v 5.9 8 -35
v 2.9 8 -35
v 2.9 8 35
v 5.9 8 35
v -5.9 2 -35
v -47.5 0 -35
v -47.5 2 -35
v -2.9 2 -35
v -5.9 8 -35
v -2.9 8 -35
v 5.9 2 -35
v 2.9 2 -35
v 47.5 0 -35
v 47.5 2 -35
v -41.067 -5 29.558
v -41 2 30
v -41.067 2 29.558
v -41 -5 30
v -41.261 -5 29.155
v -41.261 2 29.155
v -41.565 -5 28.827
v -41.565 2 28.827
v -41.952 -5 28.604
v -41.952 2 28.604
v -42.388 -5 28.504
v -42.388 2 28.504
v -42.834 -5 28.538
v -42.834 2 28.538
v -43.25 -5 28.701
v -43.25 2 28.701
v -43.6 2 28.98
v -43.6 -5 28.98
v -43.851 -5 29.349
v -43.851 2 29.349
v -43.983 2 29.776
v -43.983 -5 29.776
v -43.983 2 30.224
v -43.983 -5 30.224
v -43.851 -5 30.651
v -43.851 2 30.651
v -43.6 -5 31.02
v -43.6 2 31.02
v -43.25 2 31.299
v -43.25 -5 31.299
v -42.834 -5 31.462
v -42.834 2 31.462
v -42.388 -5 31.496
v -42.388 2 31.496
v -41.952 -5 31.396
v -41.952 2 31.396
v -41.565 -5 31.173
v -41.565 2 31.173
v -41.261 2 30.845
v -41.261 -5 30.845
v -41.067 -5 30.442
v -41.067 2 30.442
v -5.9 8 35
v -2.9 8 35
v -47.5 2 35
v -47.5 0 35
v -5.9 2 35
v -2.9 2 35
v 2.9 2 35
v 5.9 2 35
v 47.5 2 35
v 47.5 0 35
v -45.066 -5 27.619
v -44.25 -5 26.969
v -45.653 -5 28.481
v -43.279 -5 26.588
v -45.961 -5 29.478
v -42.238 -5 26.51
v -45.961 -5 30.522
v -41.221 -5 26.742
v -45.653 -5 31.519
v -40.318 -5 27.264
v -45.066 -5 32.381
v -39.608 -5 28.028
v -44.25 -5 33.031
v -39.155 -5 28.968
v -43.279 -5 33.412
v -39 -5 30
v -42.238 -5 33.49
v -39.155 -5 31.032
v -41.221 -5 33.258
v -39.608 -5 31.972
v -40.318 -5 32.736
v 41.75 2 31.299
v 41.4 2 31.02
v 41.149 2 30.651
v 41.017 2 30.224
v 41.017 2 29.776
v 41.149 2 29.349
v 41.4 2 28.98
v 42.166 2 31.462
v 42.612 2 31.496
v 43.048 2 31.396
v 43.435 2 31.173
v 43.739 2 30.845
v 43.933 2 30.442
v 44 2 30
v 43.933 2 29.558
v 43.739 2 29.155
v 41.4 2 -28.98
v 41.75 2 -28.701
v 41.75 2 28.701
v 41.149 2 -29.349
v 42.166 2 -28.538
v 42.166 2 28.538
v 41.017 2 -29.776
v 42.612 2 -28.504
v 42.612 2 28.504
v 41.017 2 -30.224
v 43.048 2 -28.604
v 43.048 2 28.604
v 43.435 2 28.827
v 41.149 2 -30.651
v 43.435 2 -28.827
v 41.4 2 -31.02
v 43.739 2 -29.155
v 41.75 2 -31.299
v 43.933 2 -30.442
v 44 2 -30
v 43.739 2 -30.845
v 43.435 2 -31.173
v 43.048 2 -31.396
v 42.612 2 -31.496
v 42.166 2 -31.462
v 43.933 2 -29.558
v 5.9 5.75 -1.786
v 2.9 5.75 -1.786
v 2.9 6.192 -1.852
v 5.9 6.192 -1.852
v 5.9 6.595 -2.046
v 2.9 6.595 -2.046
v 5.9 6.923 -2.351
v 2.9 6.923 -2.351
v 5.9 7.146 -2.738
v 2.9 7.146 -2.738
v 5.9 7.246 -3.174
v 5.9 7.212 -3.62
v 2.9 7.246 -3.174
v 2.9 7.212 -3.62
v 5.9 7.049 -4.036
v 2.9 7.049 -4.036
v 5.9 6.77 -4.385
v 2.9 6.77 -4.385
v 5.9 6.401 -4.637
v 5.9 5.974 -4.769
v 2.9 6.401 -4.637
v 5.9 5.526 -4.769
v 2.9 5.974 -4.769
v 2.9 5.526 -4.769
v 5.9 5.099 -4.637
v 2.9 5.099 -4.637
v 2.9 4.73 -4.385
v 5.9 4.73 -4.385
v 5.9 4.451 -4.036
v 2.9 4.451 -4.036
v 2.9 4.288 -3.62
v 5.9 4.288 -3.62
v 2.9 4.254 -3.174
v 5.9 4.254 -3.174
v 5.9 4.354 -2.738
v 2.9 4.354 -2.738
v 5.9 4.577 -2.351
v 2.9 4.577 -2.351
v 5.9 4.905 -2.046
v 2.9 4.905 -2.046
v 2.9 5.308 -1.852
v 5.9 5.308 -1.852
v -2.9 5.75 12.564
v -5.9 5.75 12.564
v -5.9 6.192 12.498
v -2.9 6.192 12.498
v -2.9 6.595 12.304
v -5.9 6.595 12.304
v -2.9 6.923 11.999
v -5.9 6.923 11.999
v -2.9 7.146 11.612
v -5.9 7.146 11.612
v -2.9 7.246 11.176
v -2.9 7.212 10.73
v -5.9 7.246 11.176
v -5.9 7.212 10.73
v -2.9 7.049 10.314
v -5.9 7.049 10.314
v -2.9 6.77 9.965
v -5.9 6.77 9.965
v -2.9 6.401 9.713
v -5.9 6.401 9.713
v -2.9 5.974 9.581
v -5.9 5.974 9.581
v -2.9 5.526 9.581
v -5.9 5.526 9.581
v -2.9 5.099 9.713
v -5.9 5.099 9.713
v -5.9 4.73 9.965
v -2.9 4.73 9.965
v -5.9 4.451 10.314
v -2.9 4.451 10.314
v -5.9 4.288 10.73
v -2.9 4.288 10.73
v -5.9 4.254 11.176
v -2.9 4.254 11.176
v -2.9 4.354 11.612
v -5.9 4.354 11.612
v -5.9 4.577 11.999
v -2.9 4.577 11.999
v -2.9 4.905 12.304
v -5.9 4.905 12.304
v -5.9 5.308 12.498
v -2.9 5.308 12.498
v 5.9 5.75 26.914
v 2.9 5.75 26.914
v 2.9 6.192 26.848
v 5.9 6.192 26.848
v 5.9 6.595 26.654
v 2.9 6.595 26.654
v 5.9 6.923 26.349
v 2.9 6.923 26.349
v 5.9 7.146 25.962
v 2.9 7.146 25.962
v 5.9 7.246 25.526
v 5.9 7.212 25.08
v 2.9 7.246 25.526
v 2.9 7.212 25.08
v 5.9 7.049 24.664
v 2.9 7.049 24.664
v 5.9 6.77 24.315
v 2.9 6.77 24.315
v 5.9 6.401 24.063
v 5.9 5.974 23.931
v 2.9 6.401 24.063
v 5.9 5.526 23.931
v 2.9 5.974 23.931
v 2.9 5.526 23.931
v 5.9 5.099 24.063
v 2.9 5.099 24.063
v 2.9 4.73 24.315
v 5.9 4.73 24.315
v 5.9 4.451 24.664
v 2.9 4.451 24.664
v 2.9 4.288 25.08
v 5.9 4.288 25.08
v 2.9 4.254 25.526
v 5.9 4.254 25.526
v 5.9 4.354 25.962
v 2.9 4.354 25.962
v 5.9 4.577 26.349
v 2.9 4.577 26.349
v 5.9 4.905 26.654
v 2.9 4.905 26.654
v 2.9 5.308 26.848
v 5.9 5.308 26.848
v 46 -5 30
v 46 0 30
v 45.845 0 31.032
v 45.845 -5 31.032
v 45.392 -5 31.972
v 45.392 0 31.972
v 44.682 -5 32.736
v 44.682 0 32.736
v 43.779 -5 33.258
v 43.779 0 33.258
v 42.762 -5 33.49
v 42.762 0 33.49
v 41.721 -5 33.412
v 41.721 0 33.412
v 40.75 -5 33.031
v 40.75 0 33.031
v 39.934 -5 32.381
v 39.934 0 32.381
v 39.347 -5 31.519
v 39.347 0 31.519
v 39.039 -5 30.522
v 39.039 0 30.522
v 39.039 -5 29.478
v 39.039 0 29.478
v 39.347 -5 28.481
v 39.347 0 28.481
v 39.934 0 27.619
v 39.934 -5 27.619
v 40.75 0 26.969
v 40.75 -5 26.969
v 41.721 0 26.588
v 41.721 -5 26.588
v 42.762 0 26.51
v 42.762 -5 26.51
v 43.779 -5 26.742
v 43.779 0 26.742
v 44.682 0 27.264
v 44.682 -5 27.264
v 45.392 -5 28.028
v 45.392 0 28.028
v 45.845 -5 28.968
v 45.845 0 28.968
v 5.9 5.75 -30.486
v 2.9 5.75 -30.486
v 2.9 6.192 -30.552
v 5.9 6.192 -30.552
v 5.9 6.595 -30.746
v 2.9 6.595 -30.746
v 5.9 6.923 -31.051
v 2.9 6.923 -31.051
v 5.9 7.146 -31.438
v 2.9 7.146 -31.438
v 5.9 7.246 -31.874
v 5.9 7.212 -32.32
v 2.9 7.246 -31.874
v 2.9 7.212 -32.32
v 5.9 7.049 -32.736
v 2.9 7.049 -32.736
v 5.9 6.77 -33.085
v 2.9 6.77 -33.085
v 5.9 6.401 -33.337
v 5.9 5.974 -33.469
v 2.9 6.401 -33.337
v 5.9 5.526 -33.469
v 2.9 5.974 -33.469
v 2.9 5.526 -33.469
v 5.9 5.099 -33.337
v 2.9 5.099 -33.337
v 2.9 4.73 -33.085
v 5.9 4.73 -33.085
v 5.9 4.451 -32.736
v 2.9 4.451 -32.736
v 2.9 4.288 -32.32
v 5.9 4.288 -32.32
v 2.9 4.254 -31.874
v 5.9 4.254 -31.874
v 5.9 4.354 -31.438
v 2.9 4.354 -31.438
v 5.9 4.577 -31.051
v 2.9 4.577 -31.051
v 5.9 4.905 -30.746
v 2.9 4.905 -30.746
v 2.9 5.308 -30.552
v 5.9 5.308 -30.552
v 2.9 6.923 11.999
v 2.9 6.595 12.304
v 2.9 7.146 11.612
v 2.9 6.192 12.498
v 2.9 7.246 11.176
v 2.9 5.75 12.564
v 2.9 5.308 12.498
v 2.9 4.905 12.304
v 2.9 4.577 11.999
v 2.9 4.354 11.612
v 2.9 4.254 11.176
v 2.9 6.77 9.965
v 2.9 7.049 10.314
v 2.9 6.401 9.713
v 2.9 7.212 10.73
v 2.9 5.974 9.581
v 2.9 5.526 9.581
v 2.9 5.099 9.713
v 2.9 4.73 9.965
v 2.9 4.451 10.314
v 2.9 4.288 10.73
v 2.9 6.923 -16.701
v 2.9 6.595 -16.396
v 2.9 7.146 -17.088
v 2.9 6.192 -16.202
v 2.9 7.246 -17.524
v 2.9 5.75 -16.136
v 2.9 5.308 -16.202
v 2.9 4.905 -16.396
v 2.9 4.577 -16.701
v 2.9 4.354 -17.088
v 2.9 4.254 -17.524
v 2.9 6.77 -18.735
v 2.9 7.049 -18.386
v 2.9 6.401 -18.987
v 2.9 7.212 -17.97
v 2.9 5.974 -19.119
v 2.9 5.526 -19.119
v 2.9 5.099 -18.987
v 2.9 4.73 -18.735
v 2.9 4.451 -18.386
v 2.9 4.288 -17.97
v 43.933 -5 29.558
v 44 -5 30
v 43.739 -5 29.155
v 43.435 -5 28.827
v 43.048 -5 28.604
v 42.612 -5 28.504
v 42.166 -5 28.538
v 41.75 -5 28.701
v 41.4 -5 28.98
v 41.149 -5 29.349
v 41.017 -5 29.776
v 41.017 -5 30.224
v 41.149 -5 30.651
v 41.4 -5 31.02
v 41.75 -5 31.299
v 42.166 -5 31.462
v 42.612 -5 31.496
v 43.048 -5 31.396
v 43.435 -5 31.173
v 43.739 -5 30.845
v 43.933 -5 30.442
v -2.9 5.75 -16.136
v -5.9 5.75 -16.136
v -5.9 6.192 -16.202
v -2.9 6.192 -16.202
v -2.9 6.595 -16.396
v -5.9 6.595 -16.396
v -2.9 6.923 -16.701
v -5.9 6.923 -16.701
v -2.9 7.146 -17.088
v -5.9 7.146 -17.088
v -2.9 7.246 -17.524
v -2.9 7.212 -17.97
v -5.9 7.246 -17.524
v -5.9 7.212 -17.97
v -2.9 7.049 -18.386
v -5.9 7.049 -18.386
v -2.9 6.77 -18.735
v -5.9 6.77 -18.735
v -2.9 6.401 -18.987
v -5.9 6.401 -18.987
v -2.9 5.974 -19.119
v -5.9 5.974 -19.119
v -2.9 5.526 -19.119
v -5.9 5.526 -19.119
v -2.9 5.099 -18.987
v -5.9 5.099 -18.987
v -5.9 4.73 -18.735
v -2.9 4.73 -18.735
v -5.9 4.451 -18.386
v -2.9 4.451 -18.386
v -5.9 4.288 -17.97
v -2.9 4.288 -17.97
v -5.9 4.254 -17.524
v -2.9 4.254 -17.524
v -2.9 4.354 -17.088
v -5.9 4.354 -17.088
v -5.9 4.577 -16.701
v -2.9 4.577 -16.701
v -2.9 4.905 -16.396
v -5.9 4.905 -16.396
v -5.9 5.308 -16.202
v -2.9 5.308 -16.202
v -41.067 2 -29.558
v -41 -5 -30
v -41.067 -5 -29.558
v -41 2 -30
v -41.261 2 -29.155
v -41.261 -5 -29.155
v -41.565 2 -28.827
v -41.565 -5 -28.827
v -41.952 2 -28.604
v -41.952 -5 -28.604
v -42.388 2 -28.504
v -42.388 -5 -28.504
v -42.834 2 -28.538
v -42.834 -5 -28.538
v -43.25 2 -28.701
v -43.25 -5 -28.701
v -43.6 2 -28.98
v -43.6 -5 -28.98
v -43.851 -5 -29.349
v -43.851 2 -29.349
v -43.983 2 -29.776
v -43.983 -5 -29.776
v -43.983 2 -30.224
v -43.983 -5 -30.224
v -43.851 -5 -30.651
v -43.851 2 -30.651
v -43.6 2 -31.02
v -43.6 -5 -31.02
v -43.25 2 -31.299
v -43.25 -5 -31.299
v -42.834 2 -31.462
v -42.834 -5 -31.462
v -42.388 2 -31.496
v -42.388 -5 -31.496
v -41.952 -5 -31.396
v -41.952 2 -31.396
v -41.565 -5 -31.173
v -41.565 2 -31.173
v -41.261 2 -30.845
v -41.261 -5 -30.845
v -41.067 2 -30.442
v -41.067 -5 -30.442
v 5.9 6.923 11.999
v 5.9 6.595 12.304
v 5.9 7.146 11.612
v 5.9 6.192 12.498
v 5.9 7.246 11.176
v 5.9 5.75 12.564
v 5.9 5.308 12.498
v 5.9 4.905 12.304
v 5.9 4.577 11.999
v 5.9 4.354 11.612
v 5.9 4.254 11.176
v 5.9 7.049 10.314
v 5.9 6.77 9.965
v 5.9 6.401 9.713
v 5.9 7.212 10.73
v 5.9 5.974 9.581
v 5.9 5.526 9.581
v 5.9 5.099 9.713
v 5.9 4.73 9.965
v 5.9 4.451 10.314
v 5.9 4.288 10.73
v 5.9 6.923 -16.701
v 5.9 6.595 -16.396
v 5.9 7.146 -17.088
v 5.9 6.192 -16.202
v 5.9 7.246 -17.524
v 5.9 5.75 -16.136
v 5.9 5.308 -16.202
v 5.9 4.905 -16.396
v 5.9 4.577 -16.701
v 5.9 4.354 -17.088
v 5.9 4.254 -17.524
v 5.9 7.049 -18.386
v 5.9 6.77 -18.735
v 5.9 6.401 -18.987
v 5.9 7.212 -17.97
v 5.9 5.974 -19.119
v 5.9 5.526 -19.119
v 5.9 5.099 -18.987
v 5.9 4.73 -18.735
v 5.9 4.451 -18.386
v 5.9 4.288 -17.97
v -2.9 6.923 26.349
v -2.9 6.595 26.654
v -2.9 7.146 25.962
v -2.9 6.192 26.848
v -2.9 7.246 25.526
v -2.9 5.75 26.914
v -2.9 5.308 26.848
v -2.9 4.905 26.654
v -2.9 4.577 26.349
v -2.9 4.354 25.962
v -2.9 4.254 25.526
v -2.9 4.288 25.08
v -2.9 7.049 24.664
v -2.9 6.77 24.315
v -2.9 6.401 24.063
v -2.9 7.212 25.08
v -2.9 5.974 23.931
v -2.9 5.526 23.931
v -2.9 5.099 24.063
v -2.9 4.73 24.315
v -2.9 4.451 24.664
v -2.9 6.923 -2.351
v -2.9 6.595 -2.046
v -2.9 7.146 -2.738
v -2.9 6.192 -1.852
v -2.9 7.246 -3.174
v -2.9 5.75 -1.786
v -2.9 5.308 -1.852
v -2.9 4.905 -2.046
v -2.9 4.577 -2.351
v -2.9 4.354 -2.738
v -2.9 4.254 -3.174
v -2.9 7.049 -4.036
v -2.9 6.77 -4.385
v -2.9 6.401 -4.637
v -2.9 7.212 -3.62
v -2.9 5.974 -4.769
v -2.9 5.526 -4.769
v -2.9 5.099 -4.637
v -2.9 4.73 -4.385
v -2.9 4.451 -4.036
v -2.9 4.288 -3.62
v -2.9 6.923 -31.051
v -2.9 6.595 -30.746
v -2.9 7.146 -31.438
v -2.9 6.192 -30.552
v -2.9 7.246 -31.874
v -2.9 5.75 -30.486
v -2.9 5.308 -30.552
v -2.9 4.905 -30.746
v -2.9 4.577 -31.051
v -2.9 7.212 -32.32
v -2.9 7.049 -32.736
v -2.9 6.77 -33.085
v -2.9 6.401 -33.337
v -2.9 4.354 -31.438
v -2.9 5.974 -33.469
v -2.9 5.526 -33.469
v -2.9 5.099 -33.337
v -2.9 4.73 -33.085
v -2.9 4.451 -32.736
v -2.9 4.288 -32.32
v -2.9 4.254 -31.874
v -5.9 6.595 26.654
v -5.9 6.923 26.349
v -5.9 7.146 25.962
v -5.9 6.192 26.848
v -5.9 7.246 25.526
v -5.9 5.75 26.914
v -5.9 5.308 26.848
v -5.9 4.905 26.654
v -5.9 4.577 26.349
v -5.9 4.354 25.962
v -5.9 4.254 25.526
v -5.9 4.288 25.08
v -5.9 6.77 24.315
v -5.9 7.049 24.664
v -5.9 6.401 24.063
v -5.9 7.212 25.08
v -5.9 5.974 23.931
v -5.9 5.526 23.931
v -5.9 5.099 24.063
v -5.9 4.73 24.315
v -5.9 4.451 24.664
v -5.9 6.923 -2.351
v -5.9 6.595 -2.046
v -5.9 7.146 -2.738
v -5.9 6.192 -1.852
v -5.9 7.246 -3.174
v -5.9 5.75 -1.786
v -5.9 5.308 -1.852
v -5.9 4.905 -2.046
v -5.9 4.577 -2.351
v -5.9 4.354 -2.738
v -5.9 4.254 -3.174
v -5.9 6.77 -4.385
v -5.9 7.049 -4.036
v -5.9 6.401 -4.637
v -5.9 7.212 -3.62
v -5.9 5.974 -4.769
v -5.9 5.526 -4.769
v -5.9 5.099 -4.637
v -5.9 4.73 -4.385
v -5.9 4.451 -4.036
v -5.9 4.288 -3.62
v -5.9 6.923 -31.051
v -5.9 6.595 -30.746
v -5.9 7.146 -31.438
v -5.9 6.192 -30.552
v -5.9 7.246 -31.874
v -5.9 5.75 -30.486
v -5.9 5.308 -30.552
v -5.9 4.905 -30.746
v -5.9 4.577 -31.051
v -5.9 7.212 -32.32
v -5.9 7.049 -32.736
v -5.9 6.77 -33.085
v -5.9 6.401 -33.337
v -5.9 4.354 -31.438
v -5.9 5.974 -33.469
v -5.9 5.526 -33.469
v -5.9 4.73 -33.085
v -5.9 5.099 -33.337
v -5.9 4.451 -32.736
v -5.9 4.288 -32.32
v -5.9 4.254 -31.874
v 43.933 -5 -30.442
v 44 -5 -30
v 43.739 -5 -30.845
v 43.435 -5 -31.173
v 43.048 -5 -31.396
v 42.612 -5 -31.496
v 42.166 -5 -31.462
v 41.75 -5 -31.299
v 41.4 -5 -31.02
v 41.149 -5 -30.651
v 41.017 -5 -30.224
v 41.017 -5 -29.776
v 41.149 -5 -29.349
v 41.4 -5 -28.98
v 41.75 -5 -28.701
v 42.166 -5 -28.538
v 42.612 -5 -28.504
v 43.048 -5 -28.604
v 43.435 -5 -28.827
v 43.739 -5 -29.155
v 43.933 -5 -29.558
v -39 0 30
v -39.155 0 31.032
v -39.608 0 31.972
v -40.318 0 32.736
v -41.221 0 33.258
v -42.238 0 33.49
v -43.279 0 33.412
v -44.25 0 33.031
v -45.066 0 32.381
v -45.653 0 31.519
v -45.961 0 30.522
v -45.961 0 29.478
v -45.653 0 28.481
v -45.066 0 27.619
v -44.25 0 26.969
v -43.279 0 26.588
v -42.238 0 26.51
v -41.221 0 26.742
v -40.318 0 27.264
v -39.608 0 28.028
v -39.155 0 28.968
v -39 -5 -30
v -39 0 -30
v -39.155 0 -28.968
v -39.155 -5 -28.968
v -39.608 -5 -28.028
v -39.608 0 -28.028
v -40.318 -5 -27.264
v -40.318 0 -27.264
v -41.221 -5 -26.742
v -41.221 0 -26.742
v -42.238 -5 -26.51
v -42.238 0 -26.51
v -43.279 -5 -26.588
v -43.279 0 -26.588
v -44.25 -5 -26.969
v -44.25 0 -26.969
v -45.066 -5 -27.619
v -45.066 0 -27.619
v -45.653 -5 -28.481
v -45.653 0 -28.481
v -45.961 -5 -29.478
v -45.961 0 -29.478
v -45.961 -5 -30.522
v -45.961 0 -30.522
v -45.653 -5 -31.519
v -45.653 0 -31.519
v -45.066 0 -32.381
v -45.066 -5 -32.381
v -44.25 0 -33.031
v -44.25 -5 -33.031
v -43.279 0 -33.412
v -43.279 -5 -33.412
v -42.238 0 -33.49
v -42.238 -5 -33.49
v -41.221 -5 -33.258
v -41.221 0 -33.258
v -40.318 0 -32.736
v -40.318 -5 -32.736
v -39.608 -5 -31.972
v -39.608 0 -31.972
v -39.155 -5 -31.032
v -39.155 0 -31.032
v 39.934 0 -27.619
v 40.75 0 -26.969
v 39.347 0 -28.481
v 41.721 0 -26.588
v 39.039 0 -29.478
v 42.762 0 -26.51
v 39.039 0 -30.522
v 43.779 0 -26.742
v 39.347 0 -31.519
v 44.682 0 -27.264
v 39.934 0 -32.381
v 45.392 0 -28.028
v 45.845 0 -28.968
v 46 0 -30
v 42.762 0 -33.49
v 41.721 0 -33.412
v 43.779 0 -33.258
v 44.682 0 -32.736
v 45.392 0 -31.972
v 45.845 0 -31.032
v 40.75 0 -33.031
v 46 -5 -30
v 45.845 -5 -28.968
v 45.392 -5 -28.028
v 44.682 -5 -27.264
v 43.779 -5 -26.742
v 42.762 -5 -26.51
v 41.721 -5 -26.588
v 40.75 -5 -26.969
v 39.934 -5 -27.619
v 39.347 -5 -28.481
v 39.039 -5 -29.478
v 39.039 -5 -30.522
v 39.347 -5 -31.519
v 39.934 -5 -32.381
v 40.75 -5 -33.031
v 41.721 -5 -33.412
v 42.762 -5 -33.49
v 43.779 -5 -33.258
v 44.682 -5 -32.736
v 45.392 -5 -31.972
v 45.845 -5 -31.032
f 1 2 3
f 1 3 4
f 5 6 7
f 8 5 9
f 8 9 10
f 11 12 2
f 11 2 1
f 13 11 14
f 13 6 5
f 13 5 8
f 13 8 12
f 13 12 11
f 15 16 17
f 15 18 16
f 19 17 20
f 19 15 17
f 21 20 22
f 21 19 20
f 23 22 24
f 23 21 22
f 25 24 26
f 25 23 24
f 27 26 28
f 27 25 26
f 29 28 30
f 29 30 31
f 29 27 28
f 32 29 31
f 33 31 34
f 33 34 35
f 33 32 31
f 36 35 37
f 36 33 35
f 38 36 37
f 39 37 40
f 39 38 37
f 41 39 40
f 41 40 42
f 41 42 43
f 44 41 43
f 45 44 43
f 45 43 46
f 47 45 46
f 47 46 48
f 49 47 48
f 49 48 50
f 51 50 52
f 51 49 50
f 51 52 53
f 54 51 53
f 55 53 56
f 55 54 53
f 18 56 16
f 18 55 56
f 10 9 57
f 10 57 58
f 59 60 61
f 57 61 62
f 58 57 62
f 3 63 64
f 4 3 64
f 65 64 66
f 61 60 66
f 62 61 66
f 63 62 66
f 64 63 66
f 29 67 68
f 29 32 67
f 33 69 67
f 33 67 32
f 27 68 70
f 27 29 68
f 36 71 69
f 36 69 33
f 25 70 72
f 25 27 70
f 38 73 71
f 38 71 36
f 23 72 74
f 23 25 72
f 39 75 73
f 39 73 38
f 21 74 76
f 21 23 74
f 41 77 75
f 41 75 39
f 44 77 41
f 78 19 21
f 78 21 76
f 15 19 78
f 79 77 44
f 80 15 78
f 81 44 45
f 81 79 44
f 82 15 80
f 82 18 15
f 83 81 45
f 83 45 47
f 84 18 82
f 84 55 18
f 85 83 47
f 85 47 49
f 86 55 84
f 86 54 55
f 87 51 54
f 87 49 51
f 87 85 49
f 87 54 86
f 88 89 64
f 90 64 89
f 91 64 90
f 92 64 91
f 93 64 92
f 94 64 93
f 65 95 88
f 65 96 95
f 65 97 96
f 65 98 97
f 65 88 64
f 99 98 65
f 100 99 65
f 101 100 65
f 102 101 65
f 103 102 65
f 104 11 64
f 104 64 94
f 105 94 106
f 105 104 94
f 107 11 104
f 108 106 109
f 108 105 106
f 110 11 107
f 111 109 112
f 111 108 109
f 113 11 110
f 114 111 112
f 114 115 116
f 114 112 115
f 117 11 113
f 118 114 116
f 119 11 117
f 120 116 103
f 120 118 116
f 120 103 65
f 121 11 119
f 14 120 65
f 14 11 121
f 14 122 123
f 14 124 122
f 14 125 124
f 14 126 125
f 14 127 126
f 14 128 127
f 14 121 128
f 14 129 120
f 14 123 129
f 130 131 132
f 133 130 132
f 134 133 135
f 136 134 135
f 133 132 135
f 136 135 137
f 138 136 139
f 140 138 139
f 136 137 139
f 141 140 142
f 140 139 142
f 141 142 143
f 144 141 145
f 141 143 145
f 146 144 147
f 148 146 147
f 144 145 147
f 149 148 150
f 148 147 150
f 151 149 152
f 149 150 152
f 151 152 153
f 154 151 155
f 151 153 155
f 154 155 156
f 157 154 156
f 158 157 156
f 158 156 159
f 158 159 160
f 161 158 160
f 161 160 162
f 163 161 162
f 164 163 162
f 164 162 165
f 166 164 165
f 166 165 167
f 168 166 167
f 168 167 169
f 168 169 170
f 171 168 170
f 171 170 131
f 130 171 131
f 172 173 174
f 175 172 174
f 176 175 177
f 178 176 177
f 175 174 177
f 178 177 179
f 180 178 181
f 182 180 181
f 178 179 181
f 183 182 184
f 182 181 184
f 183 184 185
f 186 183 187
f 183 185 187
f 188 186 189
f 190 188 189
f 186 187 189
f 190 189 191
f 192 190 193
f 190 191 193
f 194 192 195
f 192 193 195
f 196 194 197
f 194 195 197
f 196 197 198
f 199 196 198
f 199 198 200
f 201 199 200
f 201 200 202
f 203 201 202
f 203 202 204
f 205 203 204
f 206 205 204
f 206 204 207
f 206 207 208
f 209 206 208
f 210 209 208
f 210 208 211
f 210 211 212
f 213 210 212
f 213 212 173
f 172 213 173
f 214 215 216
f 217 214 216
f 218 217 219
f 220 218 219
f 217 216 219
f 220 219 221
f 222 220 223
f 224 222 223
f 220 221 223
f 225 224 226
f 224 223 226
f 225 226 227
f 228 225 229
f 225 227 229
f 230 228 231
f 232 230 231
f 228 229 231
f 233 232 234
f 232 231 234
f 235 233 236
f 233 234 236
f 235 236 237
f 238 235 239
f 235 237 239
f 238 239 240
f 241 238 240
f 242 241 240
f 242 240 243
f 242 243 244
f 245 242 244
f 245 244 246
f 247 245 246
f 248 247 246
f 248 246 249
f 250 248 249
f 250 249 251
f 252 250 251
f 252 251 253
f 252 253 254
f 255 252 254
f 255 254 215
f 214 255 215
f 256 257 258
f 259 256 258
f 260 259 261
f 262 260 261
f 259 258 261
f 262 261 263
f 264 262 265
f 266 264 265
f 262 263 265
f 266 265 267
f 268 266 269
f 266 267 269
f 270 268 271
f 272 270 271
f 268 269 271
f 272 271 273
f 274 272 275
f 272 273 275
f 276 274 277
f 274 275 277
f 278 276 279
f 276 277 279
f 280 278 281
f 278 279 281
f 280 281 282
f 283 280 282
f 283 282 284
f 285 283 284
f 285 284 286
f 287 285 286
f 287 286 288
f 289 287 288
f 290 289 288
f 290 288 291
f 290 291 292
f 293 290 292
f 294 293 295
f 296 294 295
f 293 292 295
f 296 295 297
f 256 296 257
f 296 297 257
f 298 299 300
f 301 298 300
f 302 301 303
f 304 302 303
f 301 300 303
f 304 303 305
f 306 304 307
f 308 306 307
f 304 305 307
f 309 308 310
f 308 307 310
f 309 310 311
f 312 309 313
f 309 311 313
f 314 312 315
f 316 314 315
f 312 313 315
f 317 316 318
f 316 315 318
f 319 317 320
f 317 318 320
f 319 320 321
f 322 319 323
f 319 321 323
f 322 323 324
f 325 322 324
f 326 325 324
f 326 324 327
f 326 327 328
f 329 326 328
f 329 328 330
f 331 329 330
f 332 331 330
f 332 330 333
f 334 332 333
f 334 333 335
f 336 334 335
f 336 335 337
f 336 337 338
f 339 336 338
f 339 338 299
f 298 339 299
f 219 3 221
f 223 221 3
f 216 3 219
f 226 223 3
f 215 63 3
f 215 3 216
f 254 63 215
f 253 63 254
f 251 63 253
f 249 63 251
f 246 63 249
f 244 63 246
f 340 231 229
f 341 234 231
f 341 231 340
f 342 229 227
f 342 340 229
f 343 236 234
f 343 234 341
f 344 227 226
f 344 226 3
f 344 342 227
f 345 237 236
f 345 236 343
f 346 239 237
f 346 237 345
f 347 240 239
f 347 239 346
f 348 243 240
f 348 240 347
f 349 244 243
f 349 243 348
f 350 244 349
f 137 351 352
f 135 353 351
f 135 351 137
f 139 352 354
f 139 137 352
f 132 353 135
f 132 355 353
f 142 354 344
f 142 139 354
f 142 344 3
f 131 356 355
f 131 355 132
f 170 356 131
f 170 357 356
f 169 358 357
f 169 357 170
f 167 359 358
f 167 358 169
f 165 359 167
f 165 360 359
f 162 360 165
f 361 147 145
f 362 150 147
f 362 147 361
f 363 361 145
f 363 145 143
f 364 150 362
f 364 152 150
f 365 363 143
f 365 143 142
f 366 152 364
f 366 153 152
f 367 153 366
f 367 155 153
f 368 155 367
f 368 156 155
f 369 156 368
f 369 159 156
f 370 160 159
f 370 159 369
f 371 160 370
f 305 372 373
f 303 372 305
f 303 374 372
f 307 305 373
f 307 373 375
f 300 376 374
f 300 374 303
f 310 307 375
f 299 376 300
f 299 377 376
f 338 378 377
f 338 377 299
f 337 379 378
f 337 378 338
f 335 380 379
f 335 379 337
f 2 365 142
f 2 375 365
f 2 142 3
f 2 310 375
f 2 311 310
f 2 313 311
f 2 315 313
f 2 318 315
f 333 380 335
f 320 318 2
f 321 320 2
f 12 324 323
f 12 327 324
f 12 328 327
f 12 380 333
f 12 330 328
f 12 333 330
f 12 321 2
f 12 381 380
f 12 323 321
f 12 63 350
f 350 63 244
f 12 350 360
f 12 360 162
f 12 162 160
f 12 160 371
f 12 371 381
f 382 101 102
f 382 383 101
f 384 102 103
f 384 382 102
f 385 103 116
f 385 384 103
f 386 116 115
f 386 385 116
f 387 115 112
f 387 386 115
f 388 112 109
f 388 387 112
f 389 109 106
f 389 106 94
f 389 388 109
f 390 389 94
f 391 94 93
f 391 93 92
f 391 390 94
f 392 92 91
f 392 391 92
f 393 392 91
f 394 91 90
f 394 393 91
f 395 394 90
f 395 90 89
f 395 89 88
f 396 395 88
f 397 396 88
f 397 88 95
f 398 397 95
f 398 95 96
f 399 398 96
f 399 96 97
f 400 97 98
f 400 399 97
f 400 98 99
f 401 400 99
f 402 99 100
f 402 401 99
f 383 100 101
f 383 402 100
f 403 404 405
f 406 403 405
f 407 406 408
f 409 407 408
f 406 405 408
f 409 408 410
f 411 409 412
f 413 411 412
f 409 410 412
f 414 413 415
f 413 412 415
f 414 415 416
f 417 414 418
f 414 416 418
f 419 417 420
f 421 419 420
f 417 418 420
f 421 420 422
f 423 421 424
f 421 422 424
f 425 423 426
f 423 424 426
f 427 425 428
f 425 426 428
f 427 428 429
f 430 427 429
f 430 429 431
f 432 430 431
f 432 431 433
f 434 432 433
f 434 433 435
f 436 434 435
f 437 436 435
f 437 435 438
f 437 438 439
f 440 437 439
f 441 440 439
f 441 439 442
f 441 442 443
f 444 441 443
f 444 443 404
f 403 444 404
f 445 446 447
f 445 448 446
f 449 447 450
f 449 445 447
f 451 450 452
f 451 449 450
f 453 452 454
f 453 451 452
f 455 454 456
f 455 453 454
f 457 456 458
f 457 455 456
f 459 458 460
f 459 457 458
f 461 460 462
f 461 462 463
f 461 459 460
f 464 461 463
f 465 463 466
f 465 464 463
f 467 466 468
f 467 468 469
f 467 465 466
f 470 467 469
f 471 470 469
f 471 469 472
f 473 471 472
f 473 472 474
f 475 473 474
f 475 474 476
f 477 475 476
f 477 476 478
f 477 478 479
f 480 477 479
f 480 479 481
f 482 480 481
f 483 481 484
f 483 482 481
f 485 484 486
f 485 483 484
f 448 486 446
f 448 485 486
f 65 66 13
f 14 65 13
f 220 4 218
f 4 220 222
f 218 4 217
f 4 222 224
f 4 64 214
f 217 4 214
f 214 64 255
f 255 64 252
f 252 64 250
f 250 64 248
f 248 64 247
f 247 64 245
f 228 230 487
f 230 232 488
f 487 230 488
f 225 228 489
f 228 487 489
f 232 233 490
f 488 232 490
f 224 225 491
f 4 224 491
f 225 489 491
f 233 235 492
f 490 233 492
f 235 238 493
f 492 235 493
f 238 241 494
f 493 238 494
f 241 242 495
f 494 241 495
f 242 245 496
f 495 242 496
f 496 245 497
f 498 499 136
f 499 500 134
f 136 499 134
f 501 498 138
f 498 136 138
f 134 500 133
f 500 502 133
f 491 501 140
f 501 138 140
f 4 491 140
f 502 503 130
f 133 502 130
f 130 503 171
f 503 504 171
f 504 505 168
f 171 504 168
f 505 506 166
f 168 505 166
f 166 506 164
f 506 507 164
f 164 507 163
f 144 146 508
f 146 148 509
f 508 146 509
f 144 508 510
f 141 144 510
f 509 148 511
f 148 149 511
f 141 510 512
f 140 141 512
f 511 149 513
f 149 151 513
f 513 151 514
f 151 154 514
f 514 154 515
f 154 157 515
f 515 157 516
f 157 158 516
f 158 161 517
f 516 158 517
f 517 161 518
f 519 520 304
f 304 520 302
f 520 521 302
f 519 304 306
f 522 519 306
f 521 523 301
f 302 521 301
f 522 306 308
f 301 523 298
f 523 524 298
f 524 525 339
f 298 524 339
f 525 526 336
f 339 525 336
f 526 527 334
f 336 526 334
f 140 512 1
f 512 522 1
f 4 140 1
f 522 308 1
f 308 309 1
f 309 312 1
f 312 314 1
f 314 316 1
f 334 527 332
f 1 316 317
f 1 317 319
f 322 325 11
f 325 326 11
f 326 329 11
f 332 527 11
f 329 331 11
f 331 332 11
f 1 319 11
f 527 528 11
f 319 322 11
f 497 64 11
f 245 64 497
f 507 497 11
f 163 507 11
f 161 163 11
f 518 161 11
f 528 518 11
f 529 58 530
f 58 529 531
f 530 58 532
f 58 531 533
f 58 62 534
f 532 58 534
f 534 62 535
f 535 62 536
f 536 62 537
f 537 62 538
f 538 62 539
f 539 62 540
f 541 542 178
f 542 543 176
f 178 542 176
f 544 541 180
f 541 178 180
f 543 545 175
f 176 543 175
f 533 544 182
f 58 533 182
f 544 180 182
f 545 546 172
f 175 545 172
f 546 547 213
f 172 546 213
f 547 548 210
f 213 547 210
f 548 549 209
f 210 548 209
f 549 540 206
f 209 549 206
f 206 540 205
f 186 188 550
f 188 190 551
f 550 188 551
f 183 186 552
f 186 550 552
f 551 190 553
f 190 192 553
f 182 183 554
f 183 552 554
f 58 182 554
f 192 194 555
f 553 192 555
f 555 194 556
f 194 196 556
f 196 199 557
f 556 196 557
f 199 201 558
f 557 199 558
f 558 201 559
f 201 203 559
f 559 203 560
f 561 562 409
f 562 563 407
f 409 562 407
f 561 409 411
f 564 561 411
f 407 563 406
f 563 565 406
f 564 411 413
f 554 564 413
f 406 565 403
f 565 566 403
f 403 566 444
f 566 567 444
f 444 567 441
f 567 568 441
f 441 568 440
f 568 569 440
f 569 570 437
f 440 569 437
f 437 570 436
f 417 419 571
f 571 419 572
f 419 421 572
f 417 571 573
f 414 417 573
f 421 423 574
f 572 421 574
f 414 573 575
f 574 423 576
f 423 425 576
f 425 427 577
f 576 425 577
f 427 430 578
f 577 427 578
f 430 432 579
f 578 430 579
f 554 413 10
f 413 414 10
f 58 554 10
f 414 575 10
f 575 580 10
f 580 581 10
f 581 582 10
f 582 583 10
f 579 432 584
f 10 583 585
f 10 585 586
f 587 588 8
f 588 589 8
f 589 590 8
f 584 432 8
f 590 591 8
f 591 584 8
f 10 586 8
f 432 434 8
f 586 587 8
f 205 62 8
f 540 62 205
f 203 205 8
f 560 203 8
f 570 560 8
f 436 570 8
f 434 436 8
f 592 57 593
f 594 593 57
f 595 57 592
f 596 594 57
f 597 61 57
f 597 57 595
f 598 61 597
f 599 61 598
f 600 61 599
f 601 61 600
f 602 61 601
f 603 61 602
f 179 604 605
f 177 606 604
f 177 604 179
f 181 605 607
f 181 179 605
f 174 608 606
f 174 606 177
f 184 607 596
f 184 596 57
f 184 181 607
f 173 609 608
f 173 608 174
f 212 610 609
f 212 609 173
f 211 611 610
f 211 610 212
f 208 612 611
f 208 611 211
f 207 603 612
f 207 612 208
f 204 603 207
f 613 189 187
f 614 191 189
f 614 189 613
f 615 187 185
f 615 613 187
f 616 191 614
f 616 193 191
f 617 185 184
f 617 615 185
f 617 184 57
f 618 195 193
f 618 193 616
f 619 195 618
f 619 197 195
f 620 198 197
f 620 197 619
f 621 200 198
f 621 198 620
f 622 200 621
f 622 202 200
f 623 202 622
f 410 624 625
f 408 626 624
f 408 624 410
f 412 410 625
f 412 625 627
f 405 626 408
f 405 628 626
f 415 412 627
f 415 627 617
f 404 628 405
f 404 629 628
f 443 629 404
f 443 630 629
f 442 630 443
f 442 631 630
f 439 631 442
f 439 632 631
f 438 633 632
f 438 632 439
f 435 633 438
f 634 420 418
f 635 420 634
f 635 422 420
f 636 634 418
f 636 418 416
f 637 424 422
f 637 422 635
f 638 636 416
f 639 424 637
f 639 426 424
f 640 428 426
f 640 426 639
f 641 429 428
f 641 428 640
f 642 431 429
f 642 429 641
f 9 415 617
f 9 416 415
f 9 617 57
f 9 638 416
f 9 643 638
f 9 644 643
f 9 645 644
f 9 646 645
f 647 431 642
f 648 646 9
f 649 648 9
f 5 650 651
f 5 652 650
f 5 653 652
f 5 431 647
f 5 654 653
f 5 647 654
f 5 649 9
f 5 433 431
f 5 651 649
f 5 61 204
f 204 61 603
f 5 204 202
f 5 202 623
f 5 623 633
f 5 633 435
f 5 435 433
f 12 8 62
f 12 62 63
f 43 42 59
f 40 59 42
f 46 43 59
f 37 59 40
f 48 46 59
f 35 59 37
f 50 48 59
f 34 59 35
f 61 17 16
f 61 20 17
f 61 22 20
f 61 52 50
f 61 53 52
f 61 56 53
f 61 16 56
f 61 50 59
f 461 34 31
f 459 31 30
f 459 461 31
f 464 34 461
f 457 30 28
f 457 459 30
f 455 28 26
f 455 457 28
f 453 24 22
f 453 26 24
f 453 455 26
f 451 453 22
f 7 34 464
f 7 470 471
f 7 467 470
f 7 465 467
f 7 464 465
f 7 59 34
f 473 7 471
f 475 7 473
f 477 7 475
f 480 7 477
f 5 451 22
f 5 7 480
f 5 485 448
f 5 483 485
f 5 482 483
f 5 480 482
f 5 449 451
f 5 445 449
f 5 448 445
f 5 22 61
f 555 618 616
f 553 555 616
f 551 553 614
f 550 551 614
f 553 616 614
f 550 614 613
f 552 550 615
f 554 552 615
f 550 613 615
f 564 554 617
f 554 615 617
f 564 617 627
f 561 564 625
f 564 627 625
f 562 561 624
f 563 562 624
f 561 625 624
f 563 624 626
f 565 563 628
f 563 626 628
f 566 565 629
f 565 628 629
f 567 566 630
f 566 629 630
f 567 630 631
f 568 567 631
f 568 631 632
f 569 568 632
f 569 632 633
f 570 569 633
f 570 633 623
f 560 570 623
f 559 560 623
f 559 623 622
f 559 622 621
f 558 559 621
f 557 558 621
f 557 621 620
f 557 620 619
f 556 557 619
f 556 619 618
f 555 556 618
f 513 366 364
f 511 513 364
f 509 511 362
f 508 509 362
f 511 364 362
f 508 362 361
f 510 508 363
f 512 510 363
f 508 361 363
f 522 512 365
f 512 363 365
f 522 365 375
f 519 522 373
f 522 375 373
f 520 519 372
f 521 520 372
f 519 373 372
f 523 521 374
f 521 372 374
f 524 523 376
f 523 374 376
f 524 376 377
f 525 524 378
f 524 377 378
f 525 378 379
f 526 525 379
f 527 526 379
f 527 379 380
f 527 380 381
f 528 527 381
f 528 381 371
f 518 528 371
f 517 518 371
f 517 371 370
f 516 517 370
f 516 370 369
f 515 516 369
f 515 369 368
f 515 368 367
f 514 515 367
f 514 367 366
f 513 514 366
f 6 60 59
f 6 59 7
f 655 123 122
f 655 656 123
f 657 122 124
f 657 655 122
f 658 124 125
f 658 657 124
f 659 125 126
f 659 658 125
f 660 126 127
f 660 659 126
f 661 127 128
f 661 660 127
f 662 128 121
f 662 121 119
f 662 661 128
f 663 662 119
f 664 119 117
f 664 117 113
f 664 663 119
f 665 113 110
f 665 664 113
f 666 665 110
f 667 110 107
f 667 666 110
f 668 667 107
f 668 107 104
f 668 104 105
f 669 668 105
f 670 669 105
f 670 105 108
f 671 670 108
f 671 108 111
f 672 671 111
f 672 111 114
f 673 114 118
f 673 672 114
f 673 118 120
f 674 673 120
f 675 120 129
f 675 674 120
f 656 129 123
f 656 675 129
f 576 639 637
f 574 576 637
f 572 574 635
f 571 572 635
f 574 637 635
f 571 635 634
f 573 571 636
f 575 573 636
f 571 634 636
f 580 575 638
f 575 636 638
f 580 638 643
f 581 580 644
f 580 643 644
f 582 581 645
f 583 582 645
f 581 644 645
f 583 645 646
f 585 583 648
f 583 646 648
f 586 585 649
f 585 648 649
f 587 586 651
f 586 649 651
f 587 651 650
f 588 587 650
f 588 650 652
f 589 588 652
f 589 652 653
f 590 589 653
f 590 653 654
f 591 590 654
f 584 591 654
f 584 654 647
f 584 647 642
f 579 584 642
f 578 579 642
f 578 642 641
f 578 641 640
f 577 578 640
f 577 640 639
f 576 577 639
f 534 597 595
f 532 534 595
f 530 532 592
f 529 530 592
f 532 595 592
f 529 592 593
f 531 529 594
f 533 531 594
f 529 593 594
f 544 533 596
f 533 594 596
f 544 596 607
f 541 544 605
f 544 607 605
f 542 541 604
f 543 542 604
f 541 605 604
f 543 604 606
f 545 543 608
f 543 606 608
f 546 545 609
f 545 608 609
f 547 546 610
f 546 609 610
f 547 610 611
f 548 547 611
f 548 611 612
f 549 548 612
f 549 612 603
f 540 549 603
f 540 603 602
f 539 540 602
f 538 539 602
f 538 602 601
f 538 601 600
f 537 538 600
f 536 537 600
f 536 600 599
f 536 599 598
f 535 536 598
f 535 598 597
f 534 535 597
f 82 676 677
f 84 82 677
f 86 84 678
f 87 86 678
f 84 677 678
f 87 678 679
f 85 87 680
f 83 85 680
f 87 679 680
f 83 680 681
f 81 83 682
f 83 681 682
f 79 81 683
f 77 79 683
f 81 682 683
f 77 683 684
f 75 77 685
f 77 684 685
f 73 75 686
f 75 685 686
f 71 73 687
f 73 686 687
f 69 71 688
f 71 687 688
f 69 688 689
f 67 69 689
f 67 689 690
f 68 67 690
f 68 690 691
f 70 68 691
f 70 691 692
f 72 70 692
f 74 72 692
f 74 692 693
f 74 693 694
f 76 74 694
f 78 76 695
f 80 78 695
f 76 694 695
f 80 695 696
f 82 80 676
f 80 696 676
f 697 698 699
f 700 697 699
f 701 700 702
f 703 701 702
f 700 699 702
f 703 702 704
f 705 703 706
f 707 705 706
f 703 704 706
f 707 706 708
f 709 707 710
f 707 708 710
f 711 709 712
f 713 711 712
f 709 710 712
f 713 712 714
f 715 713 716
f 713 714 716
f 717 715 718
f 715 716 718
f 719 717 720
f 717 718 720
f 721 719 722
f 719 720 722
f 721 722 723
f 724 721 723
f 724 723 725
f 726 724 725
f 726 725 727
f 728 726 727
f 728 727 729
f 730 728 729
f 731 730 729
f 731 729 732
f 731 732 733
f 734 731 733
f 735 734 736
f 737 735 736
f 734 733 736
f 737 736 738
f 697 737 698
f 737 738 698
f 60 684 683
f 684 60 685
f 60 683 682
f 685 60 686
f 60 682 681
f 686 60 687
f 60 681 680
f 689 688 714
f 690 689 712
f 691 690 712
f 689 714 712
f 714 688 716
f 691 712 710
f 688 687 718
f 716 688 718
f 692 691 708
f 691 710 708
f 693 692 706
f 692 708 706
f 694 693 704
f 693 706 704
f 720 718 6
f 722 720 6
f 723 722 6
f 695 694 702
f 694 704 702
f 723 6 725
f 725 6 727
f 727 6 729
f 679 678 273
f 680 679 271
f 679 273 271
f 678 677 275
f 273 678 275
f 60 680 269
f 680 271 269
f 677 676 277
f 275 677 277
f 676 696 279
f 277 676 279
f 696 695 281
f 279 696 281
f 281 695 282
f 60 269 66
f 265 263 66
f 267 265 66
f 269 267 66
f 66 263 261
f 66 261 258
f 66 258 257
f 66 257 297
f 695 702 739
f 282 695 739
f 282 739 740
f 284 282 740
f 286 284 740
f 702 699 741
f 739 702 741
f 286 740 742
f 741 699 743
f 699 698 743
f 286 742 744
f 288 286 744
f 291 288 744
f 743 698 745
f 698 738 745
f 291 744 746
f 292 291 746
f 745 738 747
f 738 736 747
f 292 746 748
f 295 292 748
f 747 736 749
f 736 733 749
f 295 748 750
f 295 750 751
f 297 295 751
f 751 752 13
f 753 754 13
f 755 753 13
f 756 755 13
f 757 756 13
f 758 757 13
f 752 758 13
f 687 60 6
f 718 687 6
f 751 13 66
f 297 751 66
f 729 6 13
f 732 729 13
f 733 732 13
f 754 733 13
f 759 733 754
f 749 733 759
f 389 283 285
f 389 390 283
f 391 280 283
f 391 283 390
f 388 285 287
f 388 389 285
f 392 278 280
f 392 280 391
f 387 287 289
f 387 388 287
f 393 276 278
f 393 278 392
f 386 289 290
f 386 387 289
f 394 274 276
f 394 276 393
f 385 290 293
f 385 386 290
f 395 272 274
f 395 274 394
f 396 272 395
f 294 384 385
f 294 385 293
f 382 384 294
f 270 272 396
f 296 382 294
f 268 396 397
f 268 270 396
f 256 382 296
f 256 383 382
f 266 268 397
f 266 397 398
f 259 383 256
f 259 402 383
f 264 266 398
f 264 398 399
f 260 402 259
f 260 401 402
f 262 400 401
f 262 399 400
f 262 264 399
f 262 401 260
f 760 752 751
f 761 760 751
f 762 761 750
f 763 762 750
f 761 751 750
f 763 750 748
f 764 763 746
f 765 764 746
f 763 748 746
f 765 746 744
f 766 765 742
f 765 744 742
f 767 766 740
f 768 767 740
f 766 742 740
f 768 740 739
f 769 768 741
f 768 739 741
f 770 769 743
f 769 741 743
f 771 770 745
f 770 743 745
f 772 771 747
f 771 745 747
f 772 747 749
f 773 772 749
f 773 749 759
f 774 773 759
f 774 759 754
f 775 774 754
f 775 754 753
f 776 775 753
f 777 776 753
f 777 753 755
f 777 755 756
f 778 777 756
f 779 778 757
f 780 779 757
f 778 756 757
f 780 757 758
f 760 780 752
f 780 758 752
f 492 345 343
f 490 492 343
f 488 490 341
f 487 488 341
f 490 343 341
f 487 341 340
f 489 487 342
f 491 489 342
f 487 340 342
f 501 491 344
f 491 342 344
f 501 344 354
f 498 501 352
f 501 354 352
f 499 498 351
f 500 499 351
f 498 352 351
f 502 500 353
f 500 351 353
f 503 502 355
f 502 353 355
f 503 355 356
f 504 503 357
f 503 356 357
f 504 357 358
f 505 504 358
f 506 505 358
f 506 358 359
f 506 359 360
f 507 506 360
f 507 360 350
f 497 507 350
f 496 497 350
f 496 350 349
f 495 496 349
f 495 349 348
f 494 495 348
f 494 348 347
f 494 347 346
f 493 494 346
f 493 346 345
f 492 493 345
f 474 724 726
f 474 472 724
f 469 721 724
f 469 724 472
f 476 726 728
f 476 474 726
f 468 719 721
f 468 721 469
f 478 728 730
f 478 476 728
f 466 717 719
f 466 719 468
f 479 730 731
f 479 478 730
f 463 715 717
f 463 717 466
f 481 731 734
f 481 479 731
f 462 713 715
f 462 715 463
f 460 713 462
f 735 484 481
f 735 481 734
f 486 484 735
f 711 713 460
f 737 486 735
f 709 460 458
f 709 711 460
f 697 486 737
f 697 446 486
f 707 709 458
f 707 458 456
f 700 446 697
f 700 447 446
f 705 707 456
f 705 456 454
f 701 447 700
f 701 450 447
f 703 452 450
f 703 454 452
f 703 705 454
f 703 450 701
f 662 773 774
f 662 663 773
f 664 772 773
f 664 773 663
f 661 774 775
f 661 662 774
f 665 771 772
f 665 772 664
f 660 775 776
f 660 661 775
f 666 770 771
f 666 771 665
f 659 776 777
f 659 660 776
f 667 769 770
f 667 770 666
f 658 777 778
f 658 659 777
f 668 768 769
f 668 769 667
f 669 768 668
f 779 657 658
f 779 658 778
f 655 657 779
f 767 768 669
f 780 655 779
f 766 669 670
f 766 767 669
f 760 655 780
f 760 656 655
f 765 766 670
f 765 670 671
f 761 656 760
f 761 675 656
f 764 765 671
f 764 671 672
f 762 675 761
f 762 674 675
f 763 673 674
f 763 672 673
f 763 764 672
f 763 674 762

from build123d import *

# Parameters (mm, degrees)
SKETCH_1_W          = 95
SKETCH_1_H          = 70
SKETCH_1_R          = 1.5
EXTRUDE_1_DEPTH     = 2
SKETCH_2_W          = 3
SKETCH_2_H          = 70
EXTRUDE_2_DEPTH     = 6
SKETCH_3_R          = 1.5
CUT_EXTRUDE_1_DEPTH = 54.4
SKETCH_4_R          = 3.5
SKETCH_4_R_2        = 1.5
EXTRUDE_3_DEPTH     = 5


with BuildPart() as part:
    # 草图1 → 凸台-拉伸1 (new body)
    with BuildSketch(Plane(origin=(0, 0, 0), x_dir=(1, 0, 0), z_dir=(0, 1, 0))):
        Rectangle(SKETCH_1_W, SKETCH_1_H)
        with Locations((-42.5, 30)):
            Circle(SKETCH_1_R, mode=Mode.SUBTRACT)
        with Locations((42.5, 30)):
            Circle(SKETCH_1_R, mode=Mode.SUBTRACT)
        with Locations((-42.5, -30)):
            Circle(SKETCH_1_R, mode=Mode.SUBTRACT)
        with Locations((42.5, -30)):
            Circle(SKETCH_1_R, mode=Mode.SUBTRACT)
    extrude(amount=EXTRUDE_1_DEPTH)

    # 草图2 → 凸台-拉伸2 (add)
    with BuildSketch(Plane(origin=(0, 2, 0), x_dir=(1, 0, 0), z_dir=(0, 1, 0))):
        with Locations((-4.4, 0)):
            Rectangle(SKETCH_2_W, SKETCH_2_H)
        with Locations((4.4, 0)):
            Rectangle(SKETCH_2_W, SKETCH_2_H)
    extrude(amount=EXTRUDE_2_DEPTH)

    # 草图3 → 切除-拉伸1 (cut, through all)
    with BuildSketch(Plane.ZY.offset(5.9)):
        with Locations((-31.985850954, 5.75)):
            Circle(SKETCH_3_R)
        with Locations((-17.635850954, 5.75)):
            Circle(SKETCH_3_R)
        with Locations((-3.285850954, 5.75)):
            Circle(SKETCH_3_R)
        with Locations((11.064149046, 5.75)):
            Circle(SKETCH_3_R)
        with Locations((25.414149046, 5.75)):
            Circle(SKETCH_3_R)
    extrude(amount=-CUT_EXTRUDE_1_DEPTH, mode=Mode.SUBTRACT)

    # 草图4 → 凸台-拉伸3 (add)
    with BuildSketch(Plane.XZ):
        with Locations((-42.5, -30)):
            Circle(SKETCH_4_R)
        with Locations((-42.5, -30)):
            Circle(SKETCH_4_R_2, mode=Mode.SUBTRACT)
        with Locations((-42.5, 30)):
            Circle(SKETCH_4_R)
        with Locations((-42.5, 30)):
            Circle(SKETCH_4_R_2, mode=Mode.SUBTRACT)
        with Locations((42.5, 30)):
            Circle(SKETCH_4_R)
        with Locations((42.5, 30)):
            Circle(SKETCH_4_R_2, mode=Mode.SUBTRACT)
        with Locations((42.5, -30)):
            Circle(SKETCH_4_R)
        with Locations((42.5, -30)):
            Circle(SKETCH_4_R_2, mode=Mode.SUBTRACT)
    extrude(amount=EXTRUDE_3_DEPTH)


solid = part.part
